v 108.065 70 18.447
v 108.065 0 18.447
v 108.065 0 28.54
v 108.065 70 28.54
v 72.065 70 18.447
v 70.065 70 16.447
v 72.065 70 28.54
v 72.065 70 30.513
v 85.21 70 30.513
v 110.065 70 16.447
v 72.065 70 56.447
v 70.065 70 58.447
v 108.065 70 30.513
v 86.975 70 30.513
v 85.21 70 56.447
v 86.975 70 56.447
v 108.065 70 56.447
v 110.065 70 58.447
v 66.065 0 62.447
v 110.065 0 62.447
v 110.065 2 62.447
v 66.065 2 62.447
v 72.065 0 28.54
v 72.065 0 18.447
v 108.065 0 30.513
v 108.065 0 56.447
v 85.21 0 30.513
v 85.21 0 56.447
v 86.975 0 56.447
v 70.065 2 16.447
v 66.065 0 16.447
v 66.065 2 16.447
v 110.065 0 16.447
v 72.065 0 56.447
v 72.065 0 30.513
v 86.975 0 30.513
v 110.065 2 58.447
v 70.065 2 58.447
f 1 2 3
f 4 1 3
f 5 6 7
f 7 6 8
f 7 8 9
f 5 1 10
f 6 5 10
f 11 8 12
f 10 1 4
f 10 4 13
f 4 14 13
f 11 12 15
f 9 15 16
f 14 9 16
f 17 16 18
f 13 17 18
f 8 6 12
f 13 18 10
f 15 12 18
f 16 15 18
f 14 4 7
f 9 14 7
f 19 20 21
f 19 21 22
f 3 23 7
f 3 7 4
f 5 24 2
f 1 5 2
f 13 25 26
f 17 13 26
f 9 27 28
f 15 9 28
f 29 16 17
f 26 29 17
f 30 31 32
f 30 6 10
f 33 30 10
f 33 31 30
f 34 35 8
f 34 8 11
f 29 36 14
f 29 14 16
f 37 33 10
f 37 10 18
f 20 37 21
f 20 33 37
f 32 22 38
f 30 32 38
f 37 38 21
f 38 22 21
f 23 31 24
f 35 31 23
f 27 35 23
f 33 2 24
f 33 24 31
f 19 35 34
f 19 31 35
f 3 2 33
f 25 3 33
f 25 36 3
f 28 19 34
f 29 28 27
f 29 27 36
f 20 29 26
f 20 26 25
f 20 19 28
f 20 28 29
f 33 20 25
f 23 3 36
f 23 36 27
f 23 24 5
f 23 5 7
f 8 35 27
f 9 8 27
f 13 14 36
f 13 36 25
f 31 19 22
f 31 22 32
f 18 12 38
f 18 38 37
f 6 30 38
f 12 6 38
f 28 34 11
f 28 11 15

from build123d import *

# Parameters (mm, degrees)
F0_W     = 40
F0_H     = 42
F0_W_2   = 36
F0_H_2   = 10.092967
F0_W_3   = 13.144892
F0_H_3   = 25.934145
F0_W_4   = 21.089894
F1_DEPTH = 70
F4_DEPTH = 2


with BuildPart() as f1:
    # F0 (on Front) → F1 (new body)
    with BuildSketch(Plane.XZ):
        with Locations((90.064679, 37.446823)):
            Rectangle(F0_W, F0_H)
        with Locations((90.064679, 23.493306)):
            Rectangle(F0_W_2, F0_H_2, mode=Mode.SUBTRACT)
        with Locations((78.637125, 43.47975)):
            Rectangle(F0_W_3, F0_H_3, mode=Mode.SUBTRACT)
        with Locations((97.519732, 43.47975)):
            Rectangle(F0_W_4, F0_H_3, mode=Mode.SUBTRACT)
    extrude(amount=-F1_DEPTH)

    # F3 (on face) → F4 (join)
    with BuildSketch(Plane.XZ):
        Polygon((110.064679, 62.446823), (66.064679, 62.446823), (66.064679, 16.446823), (70.064679, 16.446823), (70.064679, 58.446823), (110.064679, 58.446823), align=None)
    extrude(amount=-F4_DEPTH)


solid = f1.part
